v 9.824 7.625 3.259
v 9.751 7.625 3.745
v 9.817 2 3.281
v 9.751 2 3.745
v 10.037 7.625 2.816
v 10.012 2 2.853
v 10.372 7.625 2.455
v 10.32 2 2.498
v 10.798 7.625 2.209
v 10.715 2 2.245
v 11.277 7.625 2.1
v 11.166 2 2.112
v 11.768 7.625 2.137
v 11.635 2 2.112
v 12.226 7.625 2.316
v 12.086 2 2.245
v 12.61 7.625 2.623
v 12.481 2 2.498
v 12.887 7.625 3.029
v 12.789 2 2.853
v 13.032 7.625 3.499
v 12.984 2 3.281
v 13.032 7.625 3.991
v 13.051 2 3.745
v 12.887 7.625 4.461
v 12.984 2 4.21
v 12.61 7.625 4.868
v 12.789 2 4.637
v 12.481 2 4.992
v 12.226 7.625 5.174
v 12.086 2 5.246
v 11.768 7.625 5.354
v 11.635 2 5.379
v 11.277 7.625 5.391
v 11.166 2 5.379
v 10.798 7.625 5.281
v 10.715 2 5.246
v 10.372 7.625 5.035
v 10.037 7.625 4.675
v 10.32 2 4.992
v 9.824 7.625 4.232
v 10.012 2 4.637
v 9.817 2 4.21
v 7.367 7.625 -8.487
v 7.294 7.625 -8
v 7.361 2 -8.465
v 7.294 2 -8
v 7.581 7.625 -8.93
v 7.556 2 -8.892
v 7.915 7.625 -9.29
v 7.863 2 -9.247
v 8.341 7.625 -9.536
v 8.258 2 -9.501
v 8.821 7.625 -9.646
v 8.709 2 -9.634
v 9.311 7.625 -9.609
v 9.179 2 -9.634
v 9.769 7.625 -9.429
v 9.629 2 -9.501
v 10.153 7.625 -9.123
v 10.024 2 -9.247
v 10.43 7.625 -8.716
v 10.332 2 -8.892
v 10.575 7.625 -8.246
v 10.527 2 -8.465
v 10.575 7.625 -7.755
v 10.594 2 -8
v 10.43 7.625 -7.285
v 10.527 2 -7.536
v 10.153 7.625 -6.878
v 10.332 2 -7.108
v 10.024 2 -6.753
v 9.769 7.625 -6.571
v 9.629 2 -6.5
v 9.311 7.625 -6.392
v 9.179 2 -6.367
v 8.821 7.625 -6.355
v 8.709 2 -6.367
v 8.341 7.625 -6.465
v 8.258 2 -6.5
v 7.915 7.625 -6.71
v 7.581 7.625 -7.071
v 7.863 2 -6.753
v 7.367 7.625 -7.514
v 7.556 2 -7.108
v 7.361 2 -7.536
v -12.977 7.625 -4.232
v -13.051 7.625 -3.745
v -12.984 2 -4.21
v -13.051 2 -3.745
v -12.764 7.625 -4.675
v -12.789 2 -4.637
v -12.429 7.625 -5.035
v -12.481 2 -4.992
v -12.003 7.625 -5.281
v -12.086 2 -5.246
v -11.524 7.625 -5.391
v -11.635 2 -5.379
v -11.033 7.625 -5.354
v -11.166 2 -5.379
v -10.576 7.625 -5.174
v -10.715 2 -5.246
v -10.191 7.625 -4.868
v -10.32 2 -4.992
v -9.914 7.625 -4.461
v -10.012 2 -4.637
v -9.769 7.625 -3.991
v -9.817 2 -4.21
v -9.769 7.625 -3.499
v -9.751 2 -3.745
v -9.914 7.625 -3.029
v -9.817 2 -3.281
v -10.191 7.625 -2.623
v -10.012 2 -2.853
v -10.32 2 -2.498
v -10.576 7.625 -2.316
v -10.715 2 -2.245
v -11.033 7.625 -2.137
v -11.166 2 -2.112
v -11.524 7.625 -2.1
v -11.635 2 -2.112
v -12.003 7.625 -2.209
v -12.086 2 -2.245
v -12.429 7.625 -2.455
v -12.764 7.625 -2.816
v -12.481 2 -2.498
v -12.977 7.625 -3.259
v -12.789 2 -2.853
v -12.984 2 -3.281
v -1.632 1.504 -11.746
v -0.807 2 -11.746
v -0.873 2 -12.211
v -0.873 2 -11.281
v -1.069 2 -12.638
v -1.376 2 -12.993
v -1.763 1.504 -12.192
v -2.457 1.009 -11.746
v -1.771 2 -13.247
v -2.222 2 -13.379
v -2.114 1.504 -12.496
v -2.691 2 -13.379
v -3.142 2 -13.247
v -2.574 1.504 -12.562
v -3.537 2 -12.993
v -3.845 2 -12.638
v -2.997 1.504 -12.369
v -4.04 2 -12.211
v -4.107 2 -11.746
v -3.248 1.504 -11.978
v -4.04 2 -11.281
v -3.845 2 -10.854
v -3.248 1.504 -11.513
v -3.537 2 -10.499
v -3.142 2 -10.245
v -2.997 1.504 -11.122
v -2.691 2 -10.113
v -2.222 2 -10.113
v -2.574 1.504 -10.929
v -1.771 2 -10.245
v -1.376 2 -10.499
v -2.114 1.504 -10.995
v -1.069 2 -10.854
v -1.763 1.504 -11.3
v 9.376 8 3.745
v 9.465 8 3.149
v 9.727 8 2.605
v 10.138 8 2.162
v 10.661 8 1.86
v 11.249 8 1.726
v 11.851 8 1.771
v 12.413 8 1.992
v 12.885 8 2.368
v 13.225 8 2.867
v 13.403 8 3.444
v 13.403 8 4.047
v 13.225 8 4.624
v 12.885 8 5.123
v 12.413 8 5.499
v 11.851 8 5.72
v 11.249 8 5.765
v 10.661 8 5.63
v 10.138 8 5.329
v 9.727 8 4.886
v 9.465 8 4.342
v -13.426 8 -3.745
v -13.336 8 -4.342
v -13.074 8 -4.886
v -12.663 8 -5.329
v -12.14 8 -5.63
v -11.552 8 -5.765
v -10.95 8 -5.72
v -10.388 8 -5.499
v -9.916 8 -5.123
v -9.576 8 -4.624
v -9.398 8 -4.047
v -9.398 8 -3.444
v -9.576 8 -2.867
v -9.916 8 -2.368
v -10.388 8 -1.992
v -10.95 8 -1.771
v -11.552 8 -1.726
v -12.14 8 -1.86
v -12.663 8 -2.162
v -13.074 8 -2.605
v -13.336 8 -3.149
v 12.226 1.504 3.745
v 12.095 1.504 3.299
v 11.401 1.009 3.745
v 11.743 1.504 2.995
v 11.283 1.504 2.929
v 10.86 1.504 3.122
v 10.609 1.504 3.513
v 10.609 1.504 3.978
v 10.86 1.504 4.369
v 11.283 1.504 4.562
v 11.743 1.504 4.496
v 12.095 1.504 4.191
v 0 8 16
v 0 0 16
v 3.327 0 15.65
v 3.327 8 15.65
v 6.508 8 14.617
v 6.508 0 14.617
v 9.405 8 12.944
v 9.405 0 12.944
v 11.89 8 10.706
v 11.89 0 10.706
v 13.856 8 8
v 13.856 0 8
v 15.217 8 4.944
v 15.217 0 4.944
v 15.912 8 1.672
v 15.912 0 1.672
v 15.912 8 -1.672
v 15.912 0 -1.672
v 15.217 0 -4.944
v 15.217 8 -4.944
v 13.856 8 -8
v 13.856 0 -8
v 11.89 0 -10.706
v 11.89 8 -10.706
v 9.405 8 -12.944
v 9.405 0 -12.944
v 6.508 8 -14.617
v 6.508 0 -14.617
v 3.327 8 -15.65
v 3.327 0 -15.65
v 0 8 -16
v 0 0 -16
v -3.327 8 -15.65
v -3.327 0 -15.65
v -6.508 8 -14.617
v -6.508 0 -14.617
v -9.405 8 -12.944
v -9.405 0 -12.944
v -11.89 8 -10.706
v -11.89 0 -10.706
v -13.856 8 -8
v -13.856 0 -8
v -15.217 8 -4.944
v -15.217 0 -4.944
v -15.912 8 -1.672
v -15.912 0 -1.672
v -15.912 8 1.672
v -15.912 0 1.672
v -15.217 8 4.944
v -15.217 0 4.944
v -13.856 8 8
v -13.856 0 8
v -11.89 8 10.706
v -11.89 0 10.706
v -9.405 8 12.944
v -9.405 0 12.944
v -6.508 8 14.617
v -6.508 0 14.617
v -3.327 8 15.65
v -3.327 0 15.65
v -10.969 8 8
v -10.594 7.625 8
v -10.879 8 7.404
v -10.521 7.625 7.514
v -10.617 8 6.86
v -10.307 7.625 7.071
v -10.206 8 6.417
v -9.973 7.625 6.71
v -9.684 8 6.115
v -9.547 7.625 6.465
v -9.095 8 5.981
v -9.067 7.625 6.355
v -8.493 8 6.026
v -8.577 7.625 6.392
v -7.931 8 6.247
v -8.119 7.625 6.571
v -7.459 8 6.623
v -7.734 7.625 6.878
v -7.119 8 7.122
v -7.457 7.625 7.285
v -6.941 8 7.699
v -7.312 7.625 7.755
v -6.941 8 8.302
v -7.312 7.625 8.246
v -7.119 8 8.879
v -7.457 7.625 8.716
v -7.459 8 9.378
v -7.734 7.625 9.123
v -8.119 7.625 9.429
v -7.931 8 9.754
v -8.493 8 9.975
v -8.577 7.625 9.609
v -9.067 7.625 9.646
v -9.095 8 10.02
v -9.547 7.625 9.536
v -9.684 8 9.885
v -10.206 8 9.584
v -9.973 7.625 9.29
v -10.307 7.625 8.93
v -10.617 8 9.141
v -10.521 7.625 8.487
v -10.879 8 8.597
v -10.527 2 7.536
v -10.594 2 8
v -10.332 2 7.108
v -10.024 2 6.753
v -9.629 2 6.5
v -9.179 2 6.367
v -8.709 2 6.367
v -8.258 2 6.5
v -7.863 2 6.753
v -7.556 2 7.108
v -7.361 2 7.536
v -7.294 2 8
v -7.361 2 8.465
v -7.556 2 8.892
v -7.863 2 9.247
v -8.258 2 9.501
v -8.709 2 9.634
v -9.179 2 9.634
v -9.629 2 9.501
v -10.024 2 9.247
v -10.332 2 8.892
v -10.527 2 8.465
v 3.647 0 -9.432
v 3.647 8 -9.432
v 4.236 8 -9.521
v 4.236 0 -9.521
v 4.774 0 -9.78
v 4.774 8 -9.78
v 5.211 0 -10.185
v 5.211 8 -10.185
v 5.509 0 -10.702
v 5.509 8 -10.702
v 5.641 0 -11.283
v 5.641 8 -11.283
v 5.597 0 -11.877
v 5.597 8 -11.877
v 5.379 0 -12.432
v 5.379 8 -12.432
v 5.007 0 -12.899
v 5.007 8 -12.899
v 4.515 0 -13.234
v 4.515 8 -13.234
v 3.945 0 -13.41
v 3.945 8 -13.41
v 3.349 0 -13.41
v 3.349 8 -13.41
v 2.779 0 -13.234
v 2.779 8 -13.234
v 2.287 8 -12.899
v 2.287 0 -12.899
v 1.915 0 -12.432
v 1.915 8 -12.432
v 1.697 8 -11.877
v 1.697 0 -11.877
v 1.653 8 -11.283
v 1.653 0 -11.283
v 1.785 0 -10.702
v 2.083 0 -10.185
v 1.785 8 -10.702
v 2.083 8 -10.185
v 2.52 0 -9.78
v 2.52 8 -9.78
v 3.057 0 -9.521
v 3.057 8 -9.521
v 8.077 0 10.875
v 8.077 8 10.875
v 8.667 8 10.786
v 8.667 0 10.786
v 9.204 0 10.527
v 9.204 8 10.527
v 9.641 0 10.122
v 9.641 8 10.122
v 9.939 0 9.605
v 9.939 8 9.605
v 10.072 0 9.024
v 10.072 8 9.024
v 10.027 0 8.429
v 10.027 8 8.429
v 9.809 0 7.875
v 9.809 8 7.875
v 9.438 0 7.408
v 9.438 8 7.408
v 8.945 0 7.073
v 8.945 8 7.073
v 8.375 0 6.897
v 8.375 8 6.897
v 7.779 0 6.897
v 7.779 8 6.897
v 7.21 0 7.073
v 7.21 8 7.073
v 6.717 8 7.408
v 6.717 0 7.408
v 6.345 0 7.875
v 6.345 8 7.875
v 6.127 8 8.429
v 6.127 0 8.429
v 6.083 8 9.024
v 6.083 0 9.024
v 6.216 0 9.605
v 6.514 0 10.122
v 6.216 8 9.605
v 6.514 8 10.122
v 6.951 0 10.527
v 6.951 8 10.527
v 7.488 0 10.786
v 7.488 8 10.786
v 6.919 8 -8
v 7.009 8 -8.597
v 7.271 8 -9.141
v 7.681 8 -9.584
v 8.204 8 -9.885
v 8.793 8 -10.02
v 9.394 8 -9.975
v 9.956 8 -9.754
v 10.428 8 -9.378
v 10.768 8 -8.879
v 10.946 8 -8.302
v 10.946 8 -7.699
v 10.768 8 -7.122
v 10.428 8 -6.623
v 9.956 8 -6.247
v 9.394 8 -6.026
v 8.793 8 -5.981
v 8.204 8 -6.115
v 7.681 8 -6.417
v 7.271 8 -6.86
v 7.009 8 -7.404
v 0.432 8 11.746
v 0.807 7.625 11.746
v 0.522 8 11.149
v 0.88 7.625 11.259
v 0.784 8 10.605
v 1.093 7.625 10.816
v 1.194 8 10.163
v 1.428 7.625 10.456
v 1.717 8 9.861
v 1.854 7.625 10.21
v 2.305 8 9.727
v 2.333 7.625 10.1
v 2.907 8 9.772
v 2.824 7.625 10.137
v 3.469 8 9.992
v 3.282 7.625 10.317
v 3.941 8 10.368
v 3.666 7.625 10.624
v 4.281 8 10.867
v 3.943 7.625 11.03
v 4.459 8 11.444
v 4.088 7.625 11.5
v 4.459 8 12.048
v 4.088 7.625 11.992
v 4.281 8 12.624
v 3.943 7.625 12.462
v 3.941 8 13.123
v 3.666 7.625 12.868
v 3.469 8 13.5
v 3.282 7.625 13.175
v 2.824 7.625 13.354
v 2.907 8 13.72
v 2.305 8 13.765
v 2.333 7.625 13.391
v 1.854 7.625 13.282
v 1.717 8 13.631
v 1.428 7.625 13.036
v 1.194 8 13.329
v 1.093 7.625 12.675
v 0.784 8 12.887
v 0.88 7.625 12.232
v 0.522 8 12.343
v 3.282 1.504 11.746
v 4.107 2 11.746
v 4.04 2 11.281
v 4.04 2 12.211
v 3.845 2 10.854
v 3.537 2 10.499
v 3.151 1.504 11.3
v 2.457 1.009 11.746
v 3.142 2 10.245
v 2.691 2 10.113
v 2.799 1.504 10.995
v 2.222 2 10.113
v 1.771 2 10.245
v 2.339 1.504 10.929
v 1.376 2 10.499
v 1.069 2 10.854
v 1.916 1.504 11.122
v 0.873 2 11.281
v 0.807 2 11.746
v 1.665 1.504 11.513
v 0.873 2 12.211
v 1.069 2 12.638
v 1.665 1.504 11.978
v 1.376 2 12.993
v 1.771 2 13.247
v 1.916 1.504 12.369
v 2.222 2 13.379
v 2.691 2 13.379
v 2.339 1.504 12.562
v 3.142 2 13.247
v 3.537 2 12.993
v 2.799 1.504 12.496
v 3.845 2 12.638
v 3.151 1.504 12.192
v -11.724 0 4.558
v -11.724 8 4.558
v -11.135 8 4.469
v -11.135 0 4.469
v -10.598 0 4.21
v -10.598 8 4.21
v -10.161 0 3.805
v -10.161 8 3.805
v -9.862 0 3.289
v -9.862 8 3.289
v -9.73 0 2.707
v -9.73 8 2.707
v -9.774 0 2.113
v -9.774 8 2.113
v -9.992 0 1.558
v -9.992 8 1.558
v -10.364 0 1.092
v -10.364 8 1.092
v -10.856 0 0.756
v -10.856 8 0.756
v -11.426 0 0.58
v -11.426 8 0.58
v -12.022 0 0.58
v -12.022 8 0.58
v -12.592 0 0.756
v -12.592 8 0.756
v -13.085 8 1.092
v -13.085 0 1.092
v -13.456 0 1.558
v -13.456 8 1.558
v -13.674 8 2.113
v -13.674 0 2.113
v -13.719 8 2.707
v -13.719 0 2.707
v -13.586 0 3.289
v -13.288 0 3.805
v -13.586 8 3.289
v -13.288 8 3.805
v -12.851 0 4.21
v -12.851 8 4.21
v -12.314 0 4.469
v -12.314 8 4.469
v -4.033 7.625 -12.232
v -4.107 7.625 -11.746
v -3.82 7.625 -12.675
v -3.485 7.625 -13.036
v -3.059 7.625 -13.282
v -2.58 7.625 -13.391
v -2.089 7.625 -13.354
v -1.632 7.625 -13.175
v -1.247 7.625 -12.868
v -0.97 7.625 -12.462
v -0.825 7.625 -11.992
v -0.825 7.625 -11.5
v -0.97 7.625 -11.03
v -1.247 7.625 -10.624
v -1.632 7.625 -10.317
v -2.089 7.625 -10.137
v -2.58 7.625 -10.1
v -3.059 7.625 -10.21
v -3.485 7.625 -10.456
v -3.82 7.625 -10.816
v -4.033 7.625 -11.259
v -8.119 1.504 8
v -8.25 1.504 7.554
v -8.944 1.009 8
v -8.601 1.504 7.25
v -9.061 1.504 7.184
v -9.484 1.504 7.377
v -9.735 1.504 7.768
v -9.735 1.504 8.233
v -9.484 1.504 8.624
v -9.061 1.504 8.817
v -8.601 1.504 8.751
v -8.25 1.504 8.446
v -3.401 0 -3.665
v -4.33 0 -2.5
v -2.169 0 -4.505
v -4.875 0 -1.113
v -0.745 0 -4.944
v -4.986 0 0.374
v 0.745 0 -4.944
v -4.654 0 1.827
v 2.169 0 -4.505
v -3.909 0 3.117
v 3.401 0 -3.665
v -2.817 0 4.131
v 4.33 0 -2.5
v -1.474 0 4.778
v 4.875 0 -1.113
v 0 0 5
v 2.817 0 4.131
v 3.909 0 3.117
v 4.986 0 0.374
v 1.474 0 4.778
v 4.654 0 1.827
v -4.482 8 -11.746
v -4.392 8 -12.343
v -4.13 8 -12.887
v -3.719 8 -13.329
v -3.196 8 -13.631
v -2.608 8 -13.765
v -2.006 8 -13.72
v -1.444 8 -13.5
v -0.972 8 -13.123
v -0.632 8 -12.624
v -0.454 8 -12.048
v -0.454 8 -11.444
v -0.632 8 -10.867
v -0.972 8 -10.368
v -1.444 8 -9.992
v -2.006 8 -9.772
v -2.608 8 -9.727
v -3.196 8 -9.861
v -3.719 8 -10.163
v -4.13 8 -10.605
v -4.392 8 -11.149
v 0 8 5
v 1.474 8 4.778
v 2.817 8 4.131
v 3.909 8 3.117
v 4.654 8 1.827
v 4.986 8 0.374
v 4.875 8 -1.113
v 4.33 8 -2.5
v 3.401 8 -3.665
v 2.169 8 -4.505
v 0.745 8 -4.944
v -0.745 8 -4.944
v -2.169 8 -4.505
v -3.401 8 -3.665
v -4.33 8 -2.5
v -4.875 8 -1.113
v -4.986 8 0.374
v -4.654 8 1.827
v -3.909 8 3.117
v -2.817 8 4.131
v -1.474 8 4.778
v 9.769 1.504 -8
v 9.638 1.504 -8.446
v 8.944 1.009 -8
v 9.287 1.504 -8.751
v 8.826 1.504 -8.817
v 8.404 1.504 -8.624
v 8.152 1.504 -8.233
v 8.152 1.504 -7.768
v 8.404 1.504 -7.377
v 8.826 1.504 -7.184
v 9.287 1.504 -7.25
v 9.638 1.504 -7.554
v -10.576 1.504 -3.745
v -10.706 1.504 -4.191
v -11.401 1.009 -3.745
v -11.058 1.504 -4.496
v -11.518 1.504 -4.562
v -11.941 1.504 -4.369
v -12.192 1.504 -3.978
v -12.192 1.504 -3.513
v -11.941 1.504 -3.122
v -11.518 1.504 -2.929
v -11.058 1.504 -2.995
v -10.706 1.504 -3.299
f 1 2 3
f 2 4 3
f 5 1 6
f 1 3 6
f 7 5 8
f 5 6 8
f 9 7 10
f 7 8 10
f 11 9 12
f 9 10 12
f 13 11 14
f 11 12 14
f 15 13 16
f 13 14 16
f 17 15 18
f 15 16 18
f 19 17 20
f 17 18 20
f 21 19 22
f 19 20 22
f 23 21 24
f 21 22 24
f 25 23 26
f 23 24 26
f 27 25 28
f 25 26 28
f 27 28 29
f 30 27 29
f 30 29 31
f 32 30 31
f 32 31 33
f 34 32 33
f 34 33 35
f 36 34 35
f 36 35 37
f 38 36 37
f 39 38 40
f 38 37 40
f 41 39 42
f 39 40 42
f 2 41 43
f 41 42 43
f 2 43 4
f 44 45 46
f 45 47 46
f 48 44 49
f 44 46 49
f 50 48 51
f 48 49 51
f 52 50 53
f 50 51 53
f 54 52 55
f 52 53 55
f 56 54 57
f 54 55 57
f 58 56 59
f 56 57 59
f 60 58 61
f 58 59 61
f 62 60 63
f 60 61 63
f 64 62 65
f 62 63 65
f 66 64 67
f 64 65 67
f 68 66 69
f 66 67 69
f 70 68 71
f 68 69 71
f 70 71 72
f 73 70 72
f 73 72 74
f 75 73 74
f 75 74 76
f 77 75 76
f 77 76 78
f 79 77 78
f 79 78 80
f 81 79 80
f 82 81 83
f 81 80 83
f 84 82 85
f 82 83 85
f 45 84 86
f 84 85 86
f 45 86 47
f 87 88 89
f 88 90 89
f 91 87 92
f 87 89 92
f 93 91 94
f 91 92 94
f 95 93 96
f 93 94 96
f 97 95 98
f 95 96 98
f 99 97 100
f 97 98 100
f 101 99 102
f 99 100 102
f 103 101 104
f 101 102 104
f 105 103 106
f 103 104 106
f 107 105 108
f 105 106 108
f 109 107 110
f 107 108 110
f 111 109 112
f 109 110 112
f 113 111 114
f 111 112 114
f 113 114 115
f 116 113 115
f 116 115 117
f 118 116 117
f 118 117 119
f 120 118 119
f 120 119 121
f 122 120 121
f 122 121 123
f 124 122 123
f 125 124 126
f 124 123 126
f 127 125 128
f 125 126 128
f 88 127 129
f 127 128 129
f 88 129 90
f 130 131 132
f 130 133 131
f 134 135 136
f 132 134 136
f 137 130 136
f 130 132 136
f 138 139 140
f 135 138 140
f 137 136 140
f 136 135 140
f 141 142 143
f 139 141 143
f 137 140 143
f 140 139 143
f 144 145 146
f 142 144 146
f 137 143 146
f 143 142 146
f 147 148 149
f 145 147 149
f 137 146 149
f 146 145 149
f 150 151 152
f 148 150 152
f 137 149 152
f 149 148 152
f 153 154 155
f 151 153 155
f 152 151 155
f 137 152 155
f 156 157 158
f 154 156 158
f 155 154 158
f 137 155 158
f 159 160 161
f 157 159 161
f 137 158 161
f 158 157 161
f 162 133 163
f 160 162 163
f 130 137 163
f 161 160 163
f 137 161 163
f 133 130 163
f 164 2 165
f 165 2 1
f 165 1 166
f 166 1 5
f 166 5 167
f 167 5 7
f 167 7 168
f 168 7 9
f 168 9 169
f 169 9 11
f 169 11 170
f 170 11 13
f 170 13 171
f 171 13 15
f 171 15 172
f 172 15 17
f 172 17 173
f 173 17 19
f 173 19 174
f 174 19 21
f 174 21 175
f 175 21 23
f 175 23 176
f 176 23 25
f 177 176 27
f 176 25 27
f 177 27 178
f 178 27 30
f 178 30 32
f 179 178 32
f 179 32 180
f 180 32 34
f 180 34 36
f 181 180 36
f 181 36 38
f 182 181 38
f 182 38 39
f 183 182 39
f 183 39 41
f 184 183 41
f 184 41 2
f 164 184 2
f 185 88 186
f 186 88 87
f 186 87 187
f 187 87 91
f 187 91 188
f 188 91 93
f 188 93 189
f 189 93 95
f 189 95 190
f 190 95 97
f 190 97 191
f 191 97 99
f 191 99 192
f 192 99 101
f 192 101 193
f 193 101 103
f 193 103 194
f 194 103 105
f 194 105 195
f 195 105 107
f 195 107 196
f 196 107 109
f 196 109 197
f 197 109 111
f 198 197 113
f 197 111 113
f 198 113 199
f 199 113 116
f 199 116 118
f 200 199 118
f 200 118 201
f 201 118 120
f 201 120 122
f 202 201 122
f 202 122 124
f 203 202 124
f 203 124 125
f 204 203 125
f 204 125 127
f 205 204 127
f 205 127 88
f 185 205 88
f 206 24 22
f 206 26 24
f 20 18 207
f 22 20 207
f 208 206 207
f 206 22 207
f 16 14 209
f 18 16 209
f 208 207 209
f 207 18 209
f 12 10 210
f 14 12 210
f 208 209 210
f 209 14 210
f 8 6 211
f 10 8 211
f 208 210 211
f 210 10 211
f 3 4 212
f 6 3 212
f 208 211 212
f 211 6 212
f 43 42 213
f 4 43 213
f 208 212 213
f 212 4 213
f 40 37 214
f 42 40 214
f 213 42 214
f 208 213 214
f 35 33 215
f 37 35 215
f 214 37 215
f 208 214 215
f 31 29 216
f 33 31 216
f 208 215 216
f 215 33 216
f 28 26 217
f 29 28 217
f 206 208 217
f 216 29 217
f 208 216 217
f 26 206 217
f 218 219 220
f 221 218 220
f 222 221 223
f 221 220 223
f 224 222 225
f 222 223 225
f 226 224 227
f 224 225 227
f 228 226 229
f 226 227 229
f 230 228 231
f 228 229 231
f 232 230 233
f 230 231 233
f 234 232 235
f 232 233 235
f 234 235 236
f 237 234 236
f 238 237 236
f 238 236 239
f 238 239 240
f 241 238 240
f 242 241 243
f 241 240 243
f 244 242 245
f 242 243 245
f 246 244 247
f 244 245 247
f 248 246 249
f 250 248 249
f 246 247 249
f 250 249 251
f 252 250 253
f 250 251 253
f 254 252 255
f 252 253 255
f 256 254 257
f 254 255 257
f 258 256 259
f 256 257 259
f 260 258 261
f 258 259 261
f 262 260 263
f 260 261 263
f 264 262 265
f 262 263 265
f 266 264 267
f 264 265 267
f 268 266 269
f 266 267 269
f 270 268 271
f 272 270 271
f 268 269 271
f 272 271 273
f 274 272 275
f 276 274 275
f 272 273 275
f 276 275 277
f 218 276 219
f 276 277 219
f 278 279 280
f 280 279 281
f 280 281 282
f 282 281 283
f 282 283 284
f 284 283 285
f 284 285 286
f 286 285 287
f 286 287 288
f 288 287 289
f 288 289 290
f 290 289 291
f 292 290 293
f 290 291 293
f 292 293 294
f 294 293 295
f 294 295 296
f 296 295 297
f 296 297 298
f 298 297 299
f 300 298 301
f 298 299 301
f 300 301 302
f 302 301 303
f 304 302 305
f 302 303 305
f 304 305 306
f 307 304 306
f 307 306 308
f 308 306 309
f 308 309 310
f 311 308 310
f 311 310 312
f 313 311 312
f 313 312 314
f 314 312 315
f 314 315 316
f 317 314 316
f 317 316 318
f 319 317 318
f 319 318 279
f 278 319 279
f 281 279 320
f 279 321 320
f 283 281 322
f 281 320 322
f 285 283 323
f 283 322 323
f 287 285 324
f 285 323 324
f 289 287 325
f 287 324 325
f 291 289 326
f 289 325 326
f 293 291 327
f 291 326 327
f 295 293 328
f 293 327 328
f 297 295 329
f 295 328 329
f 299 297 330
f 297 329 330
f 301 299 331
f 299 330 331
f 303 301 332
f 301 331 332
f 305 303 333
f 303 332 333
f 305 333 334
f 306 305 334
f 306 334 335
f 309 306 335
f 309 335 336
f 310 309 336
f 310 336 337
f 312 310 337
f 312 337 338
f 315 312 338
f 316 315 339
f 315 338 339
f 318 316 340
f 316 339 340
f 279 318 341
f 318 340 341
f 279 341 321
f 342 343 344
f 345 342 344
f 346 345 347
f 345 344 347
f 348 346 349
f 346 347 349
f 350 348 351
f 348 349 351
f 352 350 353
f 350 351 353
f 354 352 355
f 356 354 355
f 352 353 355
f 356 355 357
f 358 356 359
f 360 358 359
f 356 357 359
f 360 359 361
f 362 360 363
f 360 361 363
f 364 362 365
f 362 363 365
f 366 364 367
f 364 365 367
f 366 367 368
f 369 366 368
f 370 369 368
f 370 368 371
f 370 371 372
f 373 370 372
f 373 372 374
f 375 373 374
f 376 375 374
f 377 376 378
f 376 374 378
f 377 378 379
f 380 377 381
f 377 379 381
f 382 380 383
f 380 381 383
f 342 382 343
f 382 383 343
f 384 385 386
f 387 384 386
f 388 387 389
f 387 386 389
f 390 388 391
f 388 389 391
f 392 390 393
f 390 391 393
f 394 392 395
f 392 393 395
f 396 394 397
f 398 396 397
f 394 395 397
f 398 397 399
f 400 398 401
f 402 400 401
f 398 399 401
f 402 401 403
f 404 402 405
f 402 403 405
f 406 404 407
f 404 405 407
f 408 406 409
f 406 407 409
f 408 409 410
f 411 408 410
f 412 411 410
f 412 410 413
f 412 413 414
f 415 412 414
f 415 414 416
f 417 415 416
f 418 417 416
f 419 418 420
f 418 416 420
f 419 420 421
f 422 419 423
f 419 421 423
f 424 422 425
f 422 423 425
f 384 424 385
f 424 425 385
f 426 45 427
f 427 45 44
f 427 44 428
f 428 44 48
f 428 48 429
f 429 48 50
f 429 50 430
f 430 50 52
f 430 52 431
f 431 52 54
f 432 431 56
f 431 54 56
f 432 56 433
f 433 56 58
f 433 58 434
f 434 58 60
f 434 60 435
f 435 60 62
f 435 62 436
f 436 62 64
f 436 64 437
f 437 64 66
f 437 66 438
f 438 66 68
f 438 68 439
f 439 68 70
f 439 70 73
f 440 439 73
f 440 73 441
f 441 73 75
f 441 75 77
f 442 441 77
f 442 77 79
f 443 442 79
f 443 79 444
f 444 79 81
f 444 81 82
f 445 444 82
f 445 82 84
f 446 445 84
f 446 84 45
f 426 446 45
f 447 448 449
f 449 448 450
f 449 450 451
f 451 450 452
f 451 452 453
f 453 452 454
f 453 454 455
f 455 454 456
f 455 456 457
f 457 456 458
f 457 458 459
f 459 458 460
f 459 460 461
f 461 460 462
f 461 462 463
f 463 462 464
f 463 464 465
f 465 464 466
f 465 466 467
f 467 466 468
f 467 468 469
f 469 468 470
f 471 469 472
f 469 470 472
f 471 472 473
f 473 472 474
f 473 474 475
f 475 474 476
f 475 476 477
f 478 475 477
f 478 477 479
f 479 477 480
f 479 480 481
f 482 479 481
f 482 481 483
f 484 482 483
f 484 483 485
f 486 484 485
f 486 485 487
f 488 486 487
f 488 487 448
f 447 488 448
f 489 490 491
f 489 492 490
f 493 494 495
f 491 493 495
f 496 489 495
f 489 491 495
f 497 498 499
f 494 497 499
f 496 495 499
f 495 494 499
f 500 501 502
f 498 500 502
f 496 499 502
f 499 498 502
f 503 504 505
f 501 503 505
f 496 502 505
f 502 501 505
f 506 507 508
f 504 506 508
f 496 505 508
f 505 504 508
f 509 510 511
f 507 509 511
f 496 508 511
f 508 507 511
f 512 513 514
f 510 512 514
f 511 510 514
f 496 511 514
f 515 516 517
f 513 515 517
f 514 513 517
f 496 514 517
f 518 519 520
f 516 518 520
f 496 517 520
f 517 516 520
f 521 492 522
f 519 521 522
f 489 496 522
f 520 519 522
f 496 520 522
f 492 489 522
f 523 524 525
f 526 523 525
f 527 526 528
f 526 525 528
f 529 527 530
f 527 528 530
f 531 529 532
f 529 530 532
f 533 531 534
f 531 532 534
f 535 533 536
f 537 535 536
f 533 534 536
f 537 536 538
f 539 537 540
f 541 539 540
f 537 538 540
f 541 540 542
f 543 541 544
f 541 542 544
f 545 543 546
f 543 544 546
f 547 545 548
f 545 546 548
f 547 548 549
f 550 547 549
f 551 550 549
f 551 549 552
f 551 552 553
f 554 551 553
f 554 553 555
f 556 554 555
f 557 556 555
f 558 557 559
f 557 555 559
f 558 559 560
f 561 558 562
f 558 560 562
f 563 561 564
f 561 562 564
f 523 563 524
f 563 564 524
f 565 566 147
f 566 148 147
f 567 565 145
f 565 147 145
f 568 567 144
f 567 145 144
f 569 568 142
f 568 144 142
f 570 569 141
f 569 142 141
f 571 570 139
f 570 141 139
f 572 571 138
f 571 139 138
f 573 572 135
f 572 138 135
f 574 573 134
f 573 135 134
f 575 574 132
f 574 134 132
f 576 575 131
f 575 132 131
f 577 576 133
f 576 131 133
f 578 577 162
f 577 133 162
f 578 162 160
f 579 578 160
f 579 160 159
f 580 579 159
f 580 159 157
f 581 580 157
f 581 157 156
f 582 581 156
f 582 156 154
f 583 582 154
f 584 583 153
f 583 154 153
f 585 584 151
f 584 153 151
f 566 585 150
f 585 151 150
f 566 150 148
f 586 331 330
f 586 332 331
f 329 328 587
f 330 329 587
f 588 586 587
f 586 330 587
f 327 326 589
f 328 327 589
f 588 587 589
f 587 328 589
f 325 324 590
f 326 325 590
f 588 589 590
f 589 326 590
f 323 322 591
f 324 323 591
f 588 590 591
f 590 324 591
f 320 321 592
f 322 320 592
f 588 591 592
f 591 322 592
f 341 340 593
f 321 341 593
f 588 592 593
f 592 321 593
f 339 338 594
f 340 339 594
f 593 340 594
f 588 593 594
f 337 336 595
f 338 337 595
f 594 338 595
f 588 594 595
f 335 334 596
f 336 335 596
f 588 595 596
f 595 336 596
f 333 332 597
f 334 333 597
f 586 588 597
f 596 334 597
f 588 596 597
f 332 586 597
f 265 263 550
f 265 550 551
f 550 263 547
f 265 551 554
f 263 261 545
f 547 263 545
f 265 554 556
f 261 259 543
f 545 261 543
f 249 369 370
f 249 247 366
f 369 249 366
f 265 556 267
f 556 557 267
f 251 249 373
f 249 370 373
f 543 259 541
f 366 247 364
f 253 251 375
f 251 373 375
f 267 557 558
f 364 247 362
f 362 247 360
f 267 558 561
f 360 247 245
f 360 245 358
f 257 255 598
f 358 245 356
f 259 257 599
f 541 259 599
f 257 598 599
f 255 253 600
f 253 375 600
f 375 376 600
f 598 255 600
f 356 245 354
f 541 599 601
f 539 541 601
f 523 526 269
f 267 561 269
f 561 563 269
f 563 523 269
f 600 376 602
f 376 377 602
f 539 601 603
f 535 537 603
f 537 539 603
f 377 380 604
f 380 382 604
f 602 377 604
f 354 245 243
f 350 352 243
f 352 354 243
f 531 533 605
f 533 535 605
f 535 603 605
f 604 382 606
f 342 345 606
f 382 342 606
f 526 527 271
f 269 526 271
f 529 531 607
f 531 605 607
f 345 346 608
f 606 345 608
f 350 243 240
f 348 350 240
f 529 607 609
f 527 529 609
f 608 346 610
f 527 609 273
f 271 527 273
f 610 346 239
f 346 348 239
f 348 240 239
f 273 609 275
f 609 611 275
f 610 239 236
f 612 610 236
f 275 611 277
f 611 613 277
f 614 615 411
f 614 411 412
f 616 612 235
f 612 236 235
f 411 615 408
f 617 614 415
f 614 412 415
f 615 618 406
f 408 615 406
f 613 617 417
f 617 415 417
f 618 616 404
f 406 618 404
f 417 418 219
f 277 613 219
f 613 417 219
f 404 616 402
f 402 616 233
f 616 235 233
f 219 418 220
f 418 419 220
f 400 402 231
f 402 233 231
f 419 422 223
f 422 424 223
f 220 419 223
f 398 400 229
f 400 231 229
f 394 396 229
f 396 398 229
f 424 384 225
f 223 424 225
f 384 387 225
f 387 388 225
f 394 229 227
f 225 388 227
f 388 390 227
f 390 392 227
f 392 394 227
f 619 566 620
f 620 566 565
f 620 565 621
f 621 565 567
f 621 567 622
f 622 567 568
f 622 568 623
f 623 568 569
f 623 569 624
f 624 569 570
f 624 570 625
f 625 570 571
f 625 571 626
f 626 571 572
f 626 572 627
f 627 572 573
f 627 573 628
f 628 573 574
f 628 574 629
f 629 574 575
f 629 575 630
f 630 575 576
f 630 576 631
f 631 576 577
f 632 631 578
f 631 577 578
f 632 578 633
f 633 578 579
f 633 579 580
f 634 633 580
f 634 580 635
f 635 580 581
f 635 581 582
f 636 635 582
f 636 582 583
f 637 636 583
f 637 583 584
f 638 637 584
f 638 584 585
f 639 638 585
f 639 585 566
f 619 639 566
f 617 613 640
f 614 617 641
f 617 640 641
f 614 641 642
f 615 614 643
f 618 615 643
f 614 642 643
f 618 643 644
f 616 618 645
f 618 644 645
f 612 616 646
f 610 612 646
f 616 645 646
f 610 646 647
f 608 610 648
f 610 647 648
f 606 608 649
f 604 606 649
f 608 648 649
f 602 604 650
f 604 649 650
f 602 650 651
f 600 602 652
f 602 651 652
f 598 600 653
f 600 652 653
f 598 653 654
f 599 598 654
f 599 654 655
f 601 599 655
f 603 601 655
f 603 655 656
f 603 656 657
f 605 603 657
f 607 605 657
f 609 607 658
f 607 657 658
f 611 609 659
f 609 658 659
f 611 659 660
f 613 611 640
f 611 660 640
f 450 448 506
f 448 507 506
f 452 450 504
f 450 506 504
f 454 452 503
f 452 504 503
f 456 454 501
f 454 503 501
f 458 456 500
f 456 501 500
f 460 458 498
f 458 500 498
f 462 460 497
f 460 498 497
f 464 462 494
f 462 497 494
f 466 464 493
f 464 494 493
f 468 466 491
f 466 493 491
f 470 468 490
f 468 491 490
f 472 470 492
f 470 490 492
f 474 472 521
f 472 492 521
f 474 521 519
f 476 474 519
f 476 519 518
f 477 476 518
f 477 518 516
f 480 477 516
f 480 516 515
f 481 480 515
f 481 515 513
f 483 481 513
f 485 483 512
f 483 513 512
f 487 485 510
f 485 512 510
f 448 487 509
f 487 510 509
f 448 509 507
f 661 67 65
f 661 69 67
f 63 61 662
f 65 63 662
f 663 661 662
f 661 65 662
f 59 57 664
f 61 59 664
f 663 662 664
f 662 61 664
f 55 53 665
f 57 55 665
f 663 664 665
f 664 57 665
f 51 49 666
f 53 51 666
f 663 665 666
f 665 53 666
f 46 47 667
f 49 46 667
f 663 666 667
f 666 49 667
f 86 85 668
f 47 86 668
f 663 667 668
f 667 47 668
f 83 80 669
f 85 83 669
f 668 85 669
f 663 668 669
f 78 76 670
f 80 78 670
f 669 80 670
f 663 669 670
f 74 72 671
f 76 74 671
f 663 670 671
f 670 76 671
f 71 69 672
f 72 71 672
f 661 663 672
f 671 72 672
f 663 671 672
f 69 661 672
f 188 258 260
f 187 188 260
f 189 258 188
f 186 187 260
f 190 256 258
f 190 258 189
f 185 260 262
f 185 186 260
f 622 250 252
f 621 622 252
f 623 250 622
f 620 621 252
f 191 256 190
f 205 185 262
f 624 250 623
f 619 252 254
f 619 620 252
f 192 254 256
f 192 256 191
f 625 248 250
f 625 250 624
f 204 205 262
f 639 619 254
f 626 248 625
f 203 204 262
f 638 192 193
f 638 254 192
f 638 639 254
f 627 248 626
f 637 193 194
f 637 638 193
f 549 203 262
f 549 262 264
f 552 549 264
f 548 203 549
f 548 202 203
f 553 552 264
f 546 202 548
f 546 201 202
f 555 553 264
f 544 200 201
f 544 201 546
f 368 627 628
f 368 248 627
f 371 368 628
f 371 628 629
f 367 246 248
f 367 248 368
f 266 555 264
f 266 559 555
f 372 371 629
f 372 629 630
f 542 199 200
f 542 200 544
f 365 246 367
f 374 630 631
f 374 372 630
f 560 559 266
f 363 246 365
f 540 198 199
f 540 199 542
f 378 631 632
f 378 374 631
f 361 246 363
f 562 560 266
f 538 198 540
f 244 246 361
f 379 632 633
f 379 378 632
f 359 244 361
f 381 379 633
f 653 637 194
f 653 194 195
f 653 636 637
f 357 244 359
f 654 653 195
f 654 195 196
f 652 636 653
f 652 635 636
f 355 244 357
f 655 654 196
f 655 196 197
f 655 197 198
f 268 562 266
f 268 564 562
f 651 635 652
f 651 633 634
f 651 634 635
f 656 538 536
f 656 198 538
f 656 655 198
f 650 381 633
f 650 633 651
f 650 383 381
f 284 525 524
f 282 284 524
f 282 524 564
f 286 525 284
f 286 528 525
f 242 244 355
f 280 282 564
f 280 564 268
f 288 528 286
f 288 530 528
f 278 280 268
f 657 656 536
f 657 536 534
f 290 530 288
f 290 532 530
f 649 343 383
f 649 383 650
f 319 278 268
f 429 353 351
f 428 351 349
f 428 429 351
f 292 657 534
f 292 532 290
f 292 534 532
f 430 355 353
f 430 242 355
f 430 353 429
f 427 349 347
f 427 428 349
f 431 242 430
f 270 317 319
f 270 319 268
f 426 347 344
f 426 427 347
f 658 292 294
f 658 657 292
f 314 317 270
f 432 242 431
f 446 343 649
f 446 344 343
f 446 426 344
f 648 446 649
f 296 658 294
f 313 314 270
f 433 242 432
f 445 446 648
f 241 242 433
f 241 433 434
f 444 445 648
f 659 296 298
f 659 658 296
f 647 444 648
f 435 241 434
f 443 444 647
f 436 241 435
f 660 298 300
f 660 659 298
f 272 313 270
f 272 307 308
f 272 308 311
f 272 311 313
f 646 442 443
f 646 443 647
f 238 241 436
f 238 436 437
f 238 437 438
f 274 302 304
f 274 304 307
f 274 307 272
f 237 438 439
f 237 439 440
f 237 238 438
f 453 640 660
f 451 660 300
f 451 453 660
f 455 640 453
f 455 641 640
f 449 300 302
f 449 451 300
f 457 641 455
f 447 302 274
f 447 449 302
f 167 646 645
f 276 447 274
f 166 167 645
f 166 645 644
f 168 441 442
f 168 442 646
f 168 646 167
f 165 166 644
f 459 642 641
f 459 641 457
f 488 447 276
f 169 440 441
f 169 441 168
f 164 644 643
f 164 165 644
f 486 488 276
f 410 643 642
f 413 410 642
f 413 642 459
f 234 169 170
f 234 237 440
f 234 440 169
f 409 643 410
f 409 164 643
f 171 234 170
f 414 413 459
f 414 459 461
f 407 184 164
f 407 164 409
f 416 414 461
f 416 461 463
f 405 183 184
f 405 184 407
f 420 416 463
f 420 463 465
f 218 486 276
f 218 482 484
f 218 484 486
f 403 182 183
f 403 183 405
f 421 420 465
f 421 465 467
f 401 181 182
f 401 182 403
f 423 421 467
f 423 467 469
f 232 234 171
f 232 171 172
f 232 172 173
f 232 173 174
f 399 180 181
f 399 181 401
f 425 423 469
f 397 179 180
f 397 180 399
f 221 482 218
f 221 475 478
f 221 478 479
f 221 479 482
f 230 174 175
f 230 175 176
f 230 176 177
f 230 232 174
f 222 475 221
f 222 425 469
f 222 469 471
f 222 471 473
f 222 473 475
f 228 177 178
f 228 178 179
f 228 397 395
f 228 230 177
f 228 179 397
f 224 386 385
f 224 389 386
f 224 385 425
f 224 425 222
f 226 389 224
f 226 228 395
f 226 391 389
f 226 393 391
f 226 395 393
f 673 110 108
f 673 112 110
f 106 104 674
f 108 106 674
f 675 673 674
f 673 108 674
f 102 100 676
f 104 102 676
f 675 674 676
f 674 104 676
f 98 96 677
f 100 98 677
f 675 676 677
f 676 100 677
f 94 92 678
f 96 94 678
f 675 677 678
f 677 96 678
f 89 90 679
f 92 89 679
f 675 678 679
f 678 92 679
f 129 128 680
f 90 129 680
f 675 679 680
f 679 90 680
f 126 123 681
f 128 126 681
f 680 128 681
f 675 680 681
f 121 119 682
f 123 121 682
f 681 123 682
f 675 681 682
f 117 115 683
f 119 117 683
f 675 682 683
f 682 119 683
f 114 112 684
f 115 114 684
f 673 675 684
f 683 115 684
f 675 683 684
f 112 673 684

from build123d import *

# Parameters (mm, degrees)
SKETCH_1_R                   = 16
EXTRUDE_1_DEPTH              = 8
HOLE_WIZARD_M4_1_D           = 3.3
HOLE_WIZARD_M4_1_DEPTH       = 6
HOLE_WIZARD_M4_1_CSINK_D     = 4.05
HOLE_WIZARD_M4_1_CSINK_ANGLE = 90
HOLE_WIZARD_M4_1_TIP         = 0.991420021
SKETCH_5_R                   = 2
CUT_EXTRUDE_1_DEPTH          = 8
SKETCH_6_R                   = 5
CUT_EXTRUDE_2_DEPTH          = 8


with BuildPart() as part:
    # 草图1 → 凸台-拉伸1 (new body)
    with BuildSketch(Plane(origin=(0, 0, 0), x_dir=(1, 0, 0), z_dir=(0, 1, 0))):
        with Locations(Location((0, 0, 0), (0, 0, 270))):
            Circle(SKETCH_1_R)
    extrude(amount=EXTRUDE_1_DEPTH)

    # M4 螺纹孔1
    with Locations(Plane(origin=(0, 8, 0), x_dir=(1, 0, 0), z_dir=(0, 1, 0))):
        with Locations((-11.400524182, 3.745403632), (-2.456647399, 11.745845374), (8.943876784, 8.000441742), (11.400524182, -3.745403632), (2.456647399, -11.745845374), (-8.943876784, -8.000441742)):
            CounterSinkHole(HOLE_WIZARD_M4_1_D / 2, HOLE_WIZARD_M4_1_CSINK_D / 2, depth=HOLE_WIZARD_M4_1_DEPTH, counter_sink_angle=HOLE_WIZARD_M4_1_CSINK_ANGLE)
            with Locations((0, 0, -(HOLE_WIZARD_M4_1_DEPTH + HOLE_WIZARD_M4_1_TIP / 2))):  # 118° drill point
                Cone(0, HOLE_WIZARD_M4_1_D / 2, HOLE_WIZARD_M4_1_TIP, mode=Mode.SUBTRACT)

    # 草图5 → 切除-拉伸1 (cut)
    with BuildSketch(Plane(origin=(0, 8, 0), x_dir=(1, 0, 0), z_dir=(0, 1, 0))):
        with Locations(Location((3.646912878, 11.432411227, 0), (0, 0, 270))):
            Circle(SKETCH_5_R)
        with Locations(Location((8.07730211, -8.874524811, 0), (0, 0, 270))):
            Circle(SKETCH_5_R)
        with Locations(Location((-11.724214988, -2.557886415, 0), (0, 0, 270))):
            Circle(SKETCH_5_R)
    extrude(amount=-CUT_EXTRUDE_1_DEPTH, mode=Mode.SUBTRACT)

    # 草图6 → 切除-拉伸2 (cut)
    with BuildSketch(Plane(origin=(0, 8, 0), x_dir=(1, 0, 0), z_dir=(0, 1, 0))):
        with Locations(Location((0, 0, 0), (0, 0, 270))):
            Circle(SKETCH_6_R)
    extrude(amount=-CUT_EXTRUDE_2_DEPTH, mode=Mode.SUBTRACT)


solid = part.part
